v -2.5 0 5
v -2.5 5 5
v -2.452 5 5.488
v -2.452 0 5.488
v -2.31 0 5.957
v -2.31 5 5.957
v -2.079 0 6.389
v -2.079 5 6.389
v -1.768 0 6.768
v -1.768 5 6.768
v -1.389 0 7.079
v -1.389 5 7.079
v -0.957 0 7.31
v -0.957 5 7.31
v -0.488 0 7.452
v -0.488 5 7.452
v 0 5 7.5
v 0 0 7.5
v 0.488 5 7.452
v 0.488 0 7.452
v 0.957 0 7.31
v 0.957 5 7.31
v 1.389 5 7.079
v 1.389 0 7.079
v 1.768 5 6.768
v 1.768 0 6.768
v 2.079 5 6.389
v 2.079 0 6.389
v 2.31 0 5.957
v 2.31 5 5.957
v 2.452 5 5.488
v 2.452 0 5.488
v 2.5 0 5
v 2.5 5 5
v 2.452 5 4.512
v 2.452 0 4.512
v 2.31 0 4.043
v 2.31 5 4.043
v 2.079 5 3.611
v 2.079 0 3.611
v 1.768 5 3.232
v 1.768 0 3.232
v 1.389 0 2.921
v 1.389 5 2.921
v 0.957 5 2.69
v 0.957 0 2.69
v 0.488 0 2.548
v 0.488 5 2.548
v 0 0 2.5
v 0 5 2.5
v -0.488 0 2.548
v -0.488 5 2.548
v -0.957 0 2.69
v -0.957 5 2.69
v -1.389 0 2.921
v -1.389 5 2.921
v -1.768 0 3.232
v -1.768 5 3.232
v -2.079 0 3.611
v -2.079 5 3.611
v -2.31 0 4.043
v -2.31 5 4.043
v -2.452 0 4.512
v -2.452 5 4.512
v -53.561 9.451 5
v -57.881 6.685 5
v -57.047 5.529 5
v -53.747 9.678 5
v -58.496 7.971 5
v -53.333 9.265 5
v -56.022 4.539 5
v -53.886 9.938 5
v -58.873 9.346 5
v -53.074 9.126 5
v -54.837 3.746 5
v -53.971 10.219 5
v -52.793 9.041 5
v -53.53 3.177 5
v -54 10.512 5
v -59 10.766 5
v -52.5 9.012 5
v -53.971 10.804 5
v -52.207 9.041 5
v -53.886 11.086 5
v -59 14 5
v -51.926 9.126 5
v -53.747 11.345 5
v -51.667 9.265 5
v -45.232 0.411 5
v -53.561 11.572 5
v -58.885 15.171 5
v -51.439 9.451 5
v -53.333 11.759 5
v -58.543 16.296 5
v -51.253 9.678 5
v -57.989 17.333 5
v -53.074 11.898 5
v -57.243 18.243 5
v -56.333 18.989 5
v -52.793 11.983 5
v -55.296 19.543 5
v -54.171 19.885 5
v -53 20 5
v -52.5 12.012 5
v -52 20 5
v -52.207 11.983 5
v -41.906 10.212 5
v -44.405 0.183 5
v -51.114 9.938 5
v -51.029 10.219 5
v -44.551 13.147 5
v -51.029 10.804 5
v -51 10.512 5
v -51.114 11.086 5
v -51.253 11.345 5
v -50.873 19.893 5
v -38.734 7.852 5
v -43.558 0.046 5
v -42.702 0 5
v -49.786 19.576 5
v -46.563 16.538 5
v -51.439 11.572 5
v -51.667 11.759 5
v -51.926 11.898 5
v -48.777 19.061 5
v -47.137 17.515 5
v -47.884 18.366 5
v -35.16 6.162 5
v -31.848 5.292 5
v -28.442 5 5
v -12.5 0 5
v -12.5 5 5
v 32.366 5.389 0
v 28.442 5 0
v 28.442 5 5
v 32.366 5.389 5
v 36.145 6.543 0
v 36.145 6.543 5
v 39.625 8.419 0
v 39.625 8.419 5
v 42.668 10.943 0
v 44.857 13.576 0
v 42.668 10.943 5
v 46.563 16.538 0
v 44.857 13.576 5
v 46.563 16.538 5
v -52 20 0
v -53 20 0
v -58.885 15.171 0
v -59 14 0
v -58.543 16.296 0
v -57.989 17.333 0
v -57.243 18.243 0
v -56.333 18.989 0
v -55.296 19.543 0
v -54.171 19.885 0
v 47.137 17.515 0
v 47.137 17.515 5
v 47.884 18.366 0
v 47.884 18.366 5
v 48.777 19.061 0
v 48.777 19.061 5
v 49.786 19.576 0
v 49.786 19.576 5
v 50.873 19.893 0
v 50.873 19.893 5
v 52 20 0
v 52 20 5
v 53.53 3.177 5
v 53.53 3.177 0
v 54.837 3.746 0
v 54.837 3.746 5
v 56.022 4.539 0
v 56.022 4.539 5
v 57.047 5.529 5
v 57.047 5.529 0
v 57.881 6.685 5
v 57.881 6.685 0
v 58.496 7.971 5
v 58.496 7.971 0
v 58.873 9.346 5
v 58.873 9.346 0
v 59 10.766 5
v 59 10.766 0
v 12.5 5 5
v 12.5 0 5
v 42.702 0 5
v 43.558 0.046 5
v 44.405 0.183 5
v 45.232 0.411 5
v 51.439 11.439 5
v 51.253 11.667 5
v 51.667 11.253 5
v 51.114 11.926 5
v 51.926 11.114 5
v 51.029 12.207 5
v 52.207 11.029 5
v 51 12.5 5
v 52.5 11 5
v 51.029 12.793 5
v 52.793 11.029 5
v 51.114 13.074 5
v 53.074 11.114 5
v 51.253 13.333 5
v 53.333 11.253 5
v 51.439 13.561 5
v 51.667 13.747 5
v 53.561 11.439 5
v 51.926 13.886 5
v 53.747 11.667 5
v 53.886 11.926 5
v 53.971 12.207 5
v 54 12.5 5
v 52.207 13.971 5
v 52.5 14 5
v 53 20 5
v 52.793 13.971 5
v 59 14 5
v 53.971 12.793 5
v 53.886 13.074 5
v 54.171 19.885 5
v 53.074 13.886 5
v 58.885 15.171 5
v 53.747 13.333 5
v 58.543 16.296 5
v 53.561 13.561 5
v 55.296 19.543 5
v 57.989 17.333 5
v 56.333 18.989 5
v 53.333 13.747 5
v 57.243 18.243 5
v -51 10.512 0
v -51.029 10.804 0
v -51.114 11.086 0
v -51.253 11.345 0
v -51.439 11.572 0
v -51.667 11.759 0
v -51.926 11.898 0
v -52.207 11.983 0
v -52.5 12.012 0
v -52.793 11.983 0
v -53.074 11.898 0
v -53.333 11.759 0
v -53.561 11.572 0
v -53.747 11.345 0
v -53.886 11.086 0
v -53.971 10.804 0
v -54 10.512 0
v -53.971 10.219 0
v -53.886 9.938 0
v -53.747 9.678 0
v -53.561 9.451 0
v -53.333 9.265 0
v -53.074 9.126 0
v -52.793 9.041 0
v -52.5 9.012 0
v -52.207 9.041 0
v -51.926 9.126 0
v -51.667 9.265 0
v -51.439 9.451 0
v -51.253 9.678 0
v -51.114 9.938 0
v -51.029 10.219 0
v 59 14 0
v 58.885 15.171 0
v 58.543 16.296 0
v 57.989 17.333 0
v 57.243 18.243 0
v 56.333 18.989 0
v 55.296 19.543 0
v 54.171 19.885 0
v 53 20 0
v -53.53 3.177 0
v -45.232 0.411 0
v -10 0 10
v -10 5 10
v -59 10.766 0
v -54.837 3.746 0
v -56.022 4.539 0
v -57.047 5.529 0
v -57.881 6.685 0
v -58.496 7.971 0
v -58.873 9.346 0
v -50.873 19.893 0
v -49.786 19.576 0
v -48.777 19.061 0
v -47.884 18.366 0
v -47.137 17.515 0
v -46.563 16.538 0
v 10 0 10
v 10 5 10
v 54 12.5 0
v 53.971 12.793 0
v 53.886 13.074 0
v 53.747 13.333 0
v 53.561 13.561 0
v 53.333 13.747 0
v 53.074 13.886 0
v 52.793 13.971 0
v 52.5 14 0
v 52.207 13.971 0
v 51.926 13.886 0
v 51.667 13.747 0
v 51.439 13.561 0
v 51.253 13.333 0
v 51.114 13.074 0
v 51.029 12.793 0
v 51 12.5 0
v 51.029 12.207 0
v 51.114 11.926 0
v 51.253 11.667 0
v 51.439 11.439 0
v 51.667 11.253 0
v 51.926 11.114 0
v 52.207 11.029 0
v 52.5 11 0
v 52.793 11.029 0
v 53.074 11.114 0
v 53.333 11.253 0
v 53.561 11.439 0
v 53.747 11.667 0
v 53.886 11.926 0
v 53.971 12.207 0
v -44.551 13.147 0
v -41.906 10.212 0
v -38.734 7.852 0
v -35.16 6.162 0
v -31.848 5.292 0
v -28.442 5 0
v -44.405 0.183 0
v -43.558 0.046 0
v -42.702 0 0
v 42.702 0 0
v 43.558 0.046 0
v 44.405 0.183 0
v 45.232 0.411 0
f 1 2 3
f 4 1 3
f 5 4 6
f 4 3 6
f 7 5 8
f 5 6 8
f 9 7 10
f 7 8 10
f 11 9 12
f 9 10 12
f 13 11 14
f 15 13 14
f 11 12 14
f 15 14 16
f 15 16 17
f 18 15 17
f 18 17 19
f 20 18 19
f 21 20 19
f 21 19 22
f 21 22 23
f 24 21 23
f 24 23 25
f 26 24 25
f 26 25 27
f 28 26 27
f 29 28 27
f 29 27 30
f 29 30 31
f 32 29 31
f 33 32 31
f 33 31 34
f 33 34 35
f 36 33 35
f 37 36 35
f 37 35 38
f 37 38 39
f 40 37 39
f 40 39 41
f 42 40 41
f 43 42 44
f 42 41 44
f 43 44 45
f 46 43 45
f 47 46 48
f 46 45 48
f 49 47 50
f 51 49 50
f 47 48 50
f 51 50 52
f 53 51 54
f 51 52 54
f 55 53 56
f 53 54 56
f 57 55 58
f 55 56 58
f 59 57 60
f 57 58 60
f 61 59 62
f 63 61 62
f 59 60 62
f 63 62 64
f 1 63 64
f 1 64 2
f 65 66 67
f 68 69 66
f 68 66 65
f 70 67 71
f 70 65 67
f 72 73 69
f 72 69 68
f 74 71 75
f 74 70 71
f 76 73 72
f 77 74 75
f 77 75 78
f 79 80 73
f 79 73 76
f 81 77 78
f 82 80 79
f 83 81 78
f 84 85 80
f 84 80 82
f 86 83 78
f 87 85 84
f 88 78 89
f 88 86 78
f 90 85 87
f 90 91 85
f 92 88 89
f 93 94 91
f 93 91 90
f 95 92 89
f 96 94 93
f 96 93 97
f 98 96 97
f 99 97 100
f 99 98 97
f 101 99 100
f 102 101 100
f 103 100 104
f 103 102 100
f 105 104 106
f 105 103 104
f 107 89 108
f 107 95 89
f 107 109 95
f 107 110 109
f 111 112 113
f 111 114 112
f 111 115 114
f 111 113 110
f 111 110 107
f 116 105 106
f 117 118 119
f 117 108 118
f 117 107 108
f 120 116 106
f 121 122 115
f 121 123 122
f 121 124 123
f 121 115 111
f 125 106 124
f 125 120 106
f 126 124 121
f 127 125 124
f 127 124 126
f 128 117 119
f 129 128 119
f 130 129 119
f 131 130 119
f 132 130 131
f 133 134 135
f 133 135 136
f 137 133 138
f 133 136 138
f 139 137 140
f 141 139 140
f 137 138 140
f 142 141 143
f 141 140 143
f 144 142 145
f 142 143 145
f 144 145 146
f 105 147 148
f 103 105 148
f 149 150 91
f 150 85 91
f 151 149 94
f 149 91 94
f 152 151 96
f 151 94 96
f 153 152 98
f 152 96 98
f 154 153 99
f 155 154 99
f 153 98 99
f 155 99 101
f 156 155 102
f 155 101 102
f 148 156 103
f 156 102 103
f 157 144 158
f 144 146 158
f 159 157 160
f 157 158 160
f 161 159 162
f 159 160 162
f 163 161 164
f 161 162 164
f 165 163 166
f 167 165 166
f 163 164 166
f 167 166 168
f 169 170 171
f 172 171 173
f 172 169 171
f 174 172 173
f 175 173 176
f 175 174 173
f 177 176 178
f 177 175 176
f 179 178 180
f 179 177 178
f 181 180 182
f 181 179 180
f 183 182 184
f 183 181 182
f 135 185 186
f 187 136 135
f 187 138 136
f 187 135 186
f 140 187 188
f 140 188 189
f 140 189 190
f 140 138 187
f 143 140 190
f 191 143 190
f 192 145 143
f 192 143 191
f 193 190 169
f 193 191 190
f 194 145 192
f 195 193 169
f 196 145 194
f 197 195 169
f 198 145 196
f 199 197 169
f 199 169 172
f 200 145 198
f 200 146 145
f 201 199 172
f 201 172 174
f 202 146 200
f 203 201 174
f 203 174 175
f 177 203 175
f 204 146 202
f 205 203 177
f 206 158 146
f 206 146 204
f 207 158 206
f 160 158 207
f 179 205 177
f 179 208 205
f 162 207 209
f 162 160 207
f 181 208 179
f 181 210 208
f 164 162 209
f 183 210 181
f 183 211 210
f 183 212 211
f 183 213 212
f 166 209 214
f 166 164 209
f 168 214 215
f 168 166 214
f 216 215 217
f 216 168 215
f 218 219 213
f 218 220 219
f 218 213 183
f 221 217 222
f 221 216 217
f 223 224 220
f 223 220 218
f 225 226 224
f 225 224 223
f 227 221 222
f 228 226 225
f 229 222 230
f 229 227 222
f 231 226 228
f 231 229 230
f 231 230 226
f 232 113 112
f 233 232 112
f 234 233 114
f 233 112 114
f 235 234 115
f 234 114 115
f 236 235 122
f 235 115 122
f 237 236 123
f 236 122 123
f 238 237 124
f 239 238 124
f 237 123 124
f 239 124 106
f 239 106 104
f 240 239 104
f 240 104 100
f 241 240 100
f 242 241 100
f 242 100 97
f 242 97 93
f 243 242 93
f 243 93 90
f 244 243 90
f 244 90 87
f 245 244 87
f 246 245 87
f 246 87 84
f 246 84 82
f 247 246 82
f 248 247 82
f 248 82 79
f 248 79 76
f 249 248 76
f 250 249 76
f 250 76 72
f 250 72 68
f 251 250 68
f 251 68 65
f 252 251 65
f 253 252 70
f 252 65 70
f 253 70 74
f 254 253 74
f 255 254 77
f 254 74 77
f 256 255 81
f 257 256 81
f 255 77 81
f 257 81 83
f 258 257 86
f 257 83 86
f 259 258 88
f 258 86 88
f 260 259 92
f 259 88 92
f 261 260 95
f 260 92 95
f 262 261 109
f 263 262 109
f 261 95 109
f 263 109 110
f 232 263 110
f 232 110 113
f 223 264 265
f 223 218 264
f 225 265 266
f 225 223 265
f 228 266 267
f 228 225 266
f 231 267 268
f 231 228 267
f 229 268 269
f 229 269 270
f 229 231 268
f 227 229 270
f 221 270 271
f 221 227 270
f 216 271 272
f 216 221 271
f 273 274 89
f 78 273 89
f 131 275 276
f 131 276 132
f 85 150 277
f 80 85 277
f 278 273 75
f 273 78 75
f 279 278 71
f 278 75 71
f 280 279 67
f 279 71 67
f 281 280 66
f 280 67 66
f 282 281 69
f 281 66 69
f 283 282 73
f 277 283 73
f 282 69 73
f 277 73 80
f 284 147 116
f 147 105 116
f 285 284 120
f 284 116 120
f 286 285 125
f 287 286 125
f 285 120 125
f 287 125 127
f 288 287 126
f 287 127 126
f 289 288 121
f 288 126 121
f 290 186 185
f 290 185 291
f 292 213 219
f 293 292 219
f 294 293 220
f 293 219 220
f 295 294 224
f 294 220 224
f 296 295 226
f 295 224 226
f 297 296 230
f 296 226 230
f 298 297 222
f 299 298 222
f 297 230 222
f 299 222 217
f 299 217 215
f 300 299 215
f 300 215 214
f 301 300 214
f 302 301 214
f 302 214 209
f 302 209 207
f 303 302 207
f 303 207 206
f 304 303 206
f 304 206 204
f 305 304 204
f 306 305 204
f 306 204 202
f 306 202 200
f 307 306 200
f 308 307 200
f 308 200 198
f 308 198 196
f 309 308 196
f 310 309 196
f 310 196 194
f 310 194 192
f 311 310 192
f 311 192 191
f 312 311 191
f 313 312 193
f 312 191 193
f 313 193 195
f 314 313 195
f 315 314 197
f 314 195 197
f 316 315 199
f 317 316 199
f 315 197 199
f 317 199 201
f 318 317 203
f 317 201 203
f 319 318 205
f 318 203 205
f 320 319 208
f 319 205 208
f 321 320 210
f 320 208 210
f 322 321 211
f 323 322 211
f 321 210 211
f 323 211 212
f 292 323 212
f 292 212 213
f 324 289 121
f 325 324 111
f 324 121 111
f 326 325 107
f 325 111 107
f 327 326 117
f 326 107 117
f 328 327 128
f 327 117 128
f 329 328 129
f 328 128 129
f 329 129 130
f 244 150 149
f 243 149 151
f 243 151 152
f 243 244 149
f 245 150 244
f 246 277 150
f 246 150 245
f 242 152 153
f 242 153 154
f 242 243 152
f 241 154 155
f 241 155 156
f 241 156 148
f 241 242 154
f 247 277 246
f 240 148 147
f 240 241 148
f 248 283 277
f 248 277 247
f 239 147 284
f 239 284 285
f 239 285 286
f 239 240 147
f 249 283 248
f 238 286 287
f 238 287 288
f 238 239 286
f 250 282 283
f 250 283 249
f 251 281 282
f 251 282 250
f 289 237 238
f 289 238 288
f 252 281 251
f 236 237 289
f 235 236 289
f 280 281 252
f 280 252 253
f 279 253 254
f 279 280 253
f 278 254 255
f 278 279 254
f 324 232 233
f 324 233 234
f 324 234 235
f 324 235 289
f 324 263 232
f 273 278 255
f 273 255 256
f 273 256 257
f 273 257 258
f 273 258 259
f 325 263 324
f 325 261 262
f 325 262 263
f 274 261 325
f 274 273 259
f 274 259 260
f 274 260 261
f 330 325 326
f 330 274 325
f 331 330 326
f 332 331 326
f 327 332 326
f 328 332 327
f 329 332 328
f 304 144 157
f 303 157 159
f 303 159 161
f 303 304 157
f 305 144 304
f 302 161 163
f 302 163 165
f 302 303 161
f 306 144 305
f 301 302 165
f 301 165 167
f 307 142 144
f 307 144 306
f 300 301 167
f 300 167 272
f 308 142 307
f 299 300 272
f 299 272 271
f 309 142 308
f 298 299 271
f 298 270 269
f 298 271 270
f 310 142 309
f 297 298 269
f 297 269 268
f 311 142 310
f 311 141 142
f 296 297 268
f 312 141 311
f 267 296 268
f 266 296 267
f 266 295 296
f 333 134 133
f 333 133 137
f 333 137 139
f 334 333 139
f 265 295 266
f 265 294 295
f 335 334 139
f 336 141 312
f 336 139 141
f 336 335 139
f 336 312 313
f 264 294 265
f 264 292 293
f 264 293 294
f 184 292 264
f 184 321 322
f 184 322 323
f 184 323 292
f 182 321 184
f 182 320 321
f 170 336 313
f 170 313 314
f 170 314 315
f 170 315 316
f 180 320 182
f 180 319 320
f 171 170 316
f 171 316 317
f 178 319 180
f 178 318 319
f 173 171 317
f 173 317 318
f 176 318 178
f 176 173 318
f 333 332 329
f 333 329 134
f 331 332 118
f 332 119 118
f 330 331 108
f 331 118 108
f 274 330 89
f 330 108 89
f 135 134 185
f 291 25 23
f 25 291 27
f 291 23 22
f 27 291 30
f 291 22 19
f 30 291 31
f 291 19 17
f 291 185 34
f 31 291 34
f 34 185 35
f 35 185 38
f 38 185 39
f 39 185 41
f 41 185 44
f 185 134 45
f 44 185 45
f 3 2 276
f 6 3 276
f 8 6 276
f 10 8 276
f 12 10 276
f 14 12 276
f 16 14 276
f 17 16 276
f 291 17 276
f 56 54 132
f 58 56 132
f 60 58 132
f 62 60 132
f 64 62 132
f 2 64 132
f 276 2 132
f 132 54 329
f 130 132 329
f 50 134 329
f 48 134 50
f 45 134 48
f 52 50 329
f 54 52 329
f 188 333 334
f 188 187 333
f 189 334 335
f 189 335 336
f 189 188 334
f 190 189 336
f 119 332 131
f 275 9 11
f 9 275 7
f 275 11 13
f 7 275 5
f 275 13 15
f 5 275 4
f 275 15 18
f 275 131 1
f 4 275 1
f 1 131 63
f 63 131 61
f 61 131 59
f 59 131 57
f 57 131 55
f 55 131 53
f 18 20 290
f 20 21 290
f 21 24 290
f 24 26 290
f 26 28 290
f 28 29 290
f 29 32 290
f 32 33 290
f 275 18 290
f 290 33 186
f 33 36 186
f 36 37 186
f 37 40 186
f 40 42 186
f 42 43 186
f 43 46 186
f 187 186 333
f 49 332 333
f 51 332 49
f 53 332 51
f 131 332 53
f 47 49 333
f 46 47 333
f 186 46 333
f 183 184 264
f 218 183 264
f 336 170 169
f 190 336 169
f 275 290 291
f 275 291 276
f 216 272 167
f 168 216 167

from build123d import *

# Parameters (mm, degrees)
F1_DEPTH    = 5
F3_DEPTH    = 5
F4_R        = 2.5
F5_DEPTH    = 25
F6_R        = 6
F7_R        = 1.5
F8_DEPTH    = 25
F9_R        = 20
F10_SIZE2   = 15
F10_SIZE    = 5
F10_2_SIZE2 = 15
F10_2_SIZE  = 5
F11_R       = 8


with BuildPart() as f1:
    # F0 (on Top) → F1 (new body)
    with BuildSketch(Plane.XY):
        Polygon((-59, 0), (0, 0), (0, 5), (-46, 5), (-46, 20), (-59, 20), align=None)
        Polygon((0, 5), (0, 0), (59, 0), (59, 20), (46, 20), (46, 5), align=None)
    extrude(amount=F1_DEPTH)

    # F2 (on Front) → F3 (join)
    with BuildSketch(Plane.XZ):
        Polygon((0, 10), (0, 0), (15, 0), (10, 10), align=None)
        Polygon((-15, 0), (0, 0), (0, 10), (-10, 10), align=None)
    extrude(amount=-F3_DEPTH)

    # F4 (on face) → F5 (cut)
    with BuildSketch(Plane(origin=(0, 5, 0), x_dir=(-1, 0, 0), z_dir=(0, 1, 0))):
        with Locations((0, 5)):
            Circle(F4_R)
    extrude(amount=-F5_DEPTH, mode=Mode.SUBTRACT)

    # F6
    f6_edges = [f1.edges().sort_by_distance(p)[0] for p in [
        (59, 20, 2.5),
        (46, 20, 2.5),
        (-46, 20, 2.5),
        (-59, 20, 2.5),
    ]]
    fillet(f6_edges, radius=F6_R)

    # F7 (on face) → F8 (cut)
    with BuildSketch(Plane.XY.offset(5)):
        with Locations((52.5, 12.5)):
            Circle(F7_R)
        with Locations((-52.5, 10.5117103085)):
            Circle(F7_R)
    extrude(amount=-F8_DEPTH, mode=Mode.SUBTRACT)

    # F9
    f9_edges = [f1.edges().sort_by_distance(p)[0] for p in [
        (46, 5, 2.5),
        (-46, 5, 2.5),
    ]]
    fillet(f9_edges, radius=F9_R)

    # F10
    f10_edges = [f1.edges().sort_by_distance(p)[0] for p in [
        (59, 0, 2.5),
    ]]
    f10_side = f1.faces().sort_by_distance((59, 7, 2.5))[0]
    chamfer(f10_edges, length=F10_SIZE, length2=F10_SIZE2, reference=f10_side)

    # F10#2
    f10_2_edges = [f1.edges().sort_by_distance(p)[0] for p in [
        (-59, 0, 2.5),
    ]]
    f10_2_side = f1.faces().sort_by_distance((-59, 7, 2.5))[0]
    chamfer(f10_2_edges, length=F10_2_SIZE, length2=F10_2_SIZE2, reference=f10_2_side)

    # F11
    f11_edges = [f1.edges().sort_by_distance(p)[0] for p in [
        (59, 5, 2.5),
        (44, 0, 2.5),
        (-44, 0, 2.5),
        (-59, 5, 2.5),
    ]]
    fillet(f11_edges, radius=F11_R)


solid = f1.part
